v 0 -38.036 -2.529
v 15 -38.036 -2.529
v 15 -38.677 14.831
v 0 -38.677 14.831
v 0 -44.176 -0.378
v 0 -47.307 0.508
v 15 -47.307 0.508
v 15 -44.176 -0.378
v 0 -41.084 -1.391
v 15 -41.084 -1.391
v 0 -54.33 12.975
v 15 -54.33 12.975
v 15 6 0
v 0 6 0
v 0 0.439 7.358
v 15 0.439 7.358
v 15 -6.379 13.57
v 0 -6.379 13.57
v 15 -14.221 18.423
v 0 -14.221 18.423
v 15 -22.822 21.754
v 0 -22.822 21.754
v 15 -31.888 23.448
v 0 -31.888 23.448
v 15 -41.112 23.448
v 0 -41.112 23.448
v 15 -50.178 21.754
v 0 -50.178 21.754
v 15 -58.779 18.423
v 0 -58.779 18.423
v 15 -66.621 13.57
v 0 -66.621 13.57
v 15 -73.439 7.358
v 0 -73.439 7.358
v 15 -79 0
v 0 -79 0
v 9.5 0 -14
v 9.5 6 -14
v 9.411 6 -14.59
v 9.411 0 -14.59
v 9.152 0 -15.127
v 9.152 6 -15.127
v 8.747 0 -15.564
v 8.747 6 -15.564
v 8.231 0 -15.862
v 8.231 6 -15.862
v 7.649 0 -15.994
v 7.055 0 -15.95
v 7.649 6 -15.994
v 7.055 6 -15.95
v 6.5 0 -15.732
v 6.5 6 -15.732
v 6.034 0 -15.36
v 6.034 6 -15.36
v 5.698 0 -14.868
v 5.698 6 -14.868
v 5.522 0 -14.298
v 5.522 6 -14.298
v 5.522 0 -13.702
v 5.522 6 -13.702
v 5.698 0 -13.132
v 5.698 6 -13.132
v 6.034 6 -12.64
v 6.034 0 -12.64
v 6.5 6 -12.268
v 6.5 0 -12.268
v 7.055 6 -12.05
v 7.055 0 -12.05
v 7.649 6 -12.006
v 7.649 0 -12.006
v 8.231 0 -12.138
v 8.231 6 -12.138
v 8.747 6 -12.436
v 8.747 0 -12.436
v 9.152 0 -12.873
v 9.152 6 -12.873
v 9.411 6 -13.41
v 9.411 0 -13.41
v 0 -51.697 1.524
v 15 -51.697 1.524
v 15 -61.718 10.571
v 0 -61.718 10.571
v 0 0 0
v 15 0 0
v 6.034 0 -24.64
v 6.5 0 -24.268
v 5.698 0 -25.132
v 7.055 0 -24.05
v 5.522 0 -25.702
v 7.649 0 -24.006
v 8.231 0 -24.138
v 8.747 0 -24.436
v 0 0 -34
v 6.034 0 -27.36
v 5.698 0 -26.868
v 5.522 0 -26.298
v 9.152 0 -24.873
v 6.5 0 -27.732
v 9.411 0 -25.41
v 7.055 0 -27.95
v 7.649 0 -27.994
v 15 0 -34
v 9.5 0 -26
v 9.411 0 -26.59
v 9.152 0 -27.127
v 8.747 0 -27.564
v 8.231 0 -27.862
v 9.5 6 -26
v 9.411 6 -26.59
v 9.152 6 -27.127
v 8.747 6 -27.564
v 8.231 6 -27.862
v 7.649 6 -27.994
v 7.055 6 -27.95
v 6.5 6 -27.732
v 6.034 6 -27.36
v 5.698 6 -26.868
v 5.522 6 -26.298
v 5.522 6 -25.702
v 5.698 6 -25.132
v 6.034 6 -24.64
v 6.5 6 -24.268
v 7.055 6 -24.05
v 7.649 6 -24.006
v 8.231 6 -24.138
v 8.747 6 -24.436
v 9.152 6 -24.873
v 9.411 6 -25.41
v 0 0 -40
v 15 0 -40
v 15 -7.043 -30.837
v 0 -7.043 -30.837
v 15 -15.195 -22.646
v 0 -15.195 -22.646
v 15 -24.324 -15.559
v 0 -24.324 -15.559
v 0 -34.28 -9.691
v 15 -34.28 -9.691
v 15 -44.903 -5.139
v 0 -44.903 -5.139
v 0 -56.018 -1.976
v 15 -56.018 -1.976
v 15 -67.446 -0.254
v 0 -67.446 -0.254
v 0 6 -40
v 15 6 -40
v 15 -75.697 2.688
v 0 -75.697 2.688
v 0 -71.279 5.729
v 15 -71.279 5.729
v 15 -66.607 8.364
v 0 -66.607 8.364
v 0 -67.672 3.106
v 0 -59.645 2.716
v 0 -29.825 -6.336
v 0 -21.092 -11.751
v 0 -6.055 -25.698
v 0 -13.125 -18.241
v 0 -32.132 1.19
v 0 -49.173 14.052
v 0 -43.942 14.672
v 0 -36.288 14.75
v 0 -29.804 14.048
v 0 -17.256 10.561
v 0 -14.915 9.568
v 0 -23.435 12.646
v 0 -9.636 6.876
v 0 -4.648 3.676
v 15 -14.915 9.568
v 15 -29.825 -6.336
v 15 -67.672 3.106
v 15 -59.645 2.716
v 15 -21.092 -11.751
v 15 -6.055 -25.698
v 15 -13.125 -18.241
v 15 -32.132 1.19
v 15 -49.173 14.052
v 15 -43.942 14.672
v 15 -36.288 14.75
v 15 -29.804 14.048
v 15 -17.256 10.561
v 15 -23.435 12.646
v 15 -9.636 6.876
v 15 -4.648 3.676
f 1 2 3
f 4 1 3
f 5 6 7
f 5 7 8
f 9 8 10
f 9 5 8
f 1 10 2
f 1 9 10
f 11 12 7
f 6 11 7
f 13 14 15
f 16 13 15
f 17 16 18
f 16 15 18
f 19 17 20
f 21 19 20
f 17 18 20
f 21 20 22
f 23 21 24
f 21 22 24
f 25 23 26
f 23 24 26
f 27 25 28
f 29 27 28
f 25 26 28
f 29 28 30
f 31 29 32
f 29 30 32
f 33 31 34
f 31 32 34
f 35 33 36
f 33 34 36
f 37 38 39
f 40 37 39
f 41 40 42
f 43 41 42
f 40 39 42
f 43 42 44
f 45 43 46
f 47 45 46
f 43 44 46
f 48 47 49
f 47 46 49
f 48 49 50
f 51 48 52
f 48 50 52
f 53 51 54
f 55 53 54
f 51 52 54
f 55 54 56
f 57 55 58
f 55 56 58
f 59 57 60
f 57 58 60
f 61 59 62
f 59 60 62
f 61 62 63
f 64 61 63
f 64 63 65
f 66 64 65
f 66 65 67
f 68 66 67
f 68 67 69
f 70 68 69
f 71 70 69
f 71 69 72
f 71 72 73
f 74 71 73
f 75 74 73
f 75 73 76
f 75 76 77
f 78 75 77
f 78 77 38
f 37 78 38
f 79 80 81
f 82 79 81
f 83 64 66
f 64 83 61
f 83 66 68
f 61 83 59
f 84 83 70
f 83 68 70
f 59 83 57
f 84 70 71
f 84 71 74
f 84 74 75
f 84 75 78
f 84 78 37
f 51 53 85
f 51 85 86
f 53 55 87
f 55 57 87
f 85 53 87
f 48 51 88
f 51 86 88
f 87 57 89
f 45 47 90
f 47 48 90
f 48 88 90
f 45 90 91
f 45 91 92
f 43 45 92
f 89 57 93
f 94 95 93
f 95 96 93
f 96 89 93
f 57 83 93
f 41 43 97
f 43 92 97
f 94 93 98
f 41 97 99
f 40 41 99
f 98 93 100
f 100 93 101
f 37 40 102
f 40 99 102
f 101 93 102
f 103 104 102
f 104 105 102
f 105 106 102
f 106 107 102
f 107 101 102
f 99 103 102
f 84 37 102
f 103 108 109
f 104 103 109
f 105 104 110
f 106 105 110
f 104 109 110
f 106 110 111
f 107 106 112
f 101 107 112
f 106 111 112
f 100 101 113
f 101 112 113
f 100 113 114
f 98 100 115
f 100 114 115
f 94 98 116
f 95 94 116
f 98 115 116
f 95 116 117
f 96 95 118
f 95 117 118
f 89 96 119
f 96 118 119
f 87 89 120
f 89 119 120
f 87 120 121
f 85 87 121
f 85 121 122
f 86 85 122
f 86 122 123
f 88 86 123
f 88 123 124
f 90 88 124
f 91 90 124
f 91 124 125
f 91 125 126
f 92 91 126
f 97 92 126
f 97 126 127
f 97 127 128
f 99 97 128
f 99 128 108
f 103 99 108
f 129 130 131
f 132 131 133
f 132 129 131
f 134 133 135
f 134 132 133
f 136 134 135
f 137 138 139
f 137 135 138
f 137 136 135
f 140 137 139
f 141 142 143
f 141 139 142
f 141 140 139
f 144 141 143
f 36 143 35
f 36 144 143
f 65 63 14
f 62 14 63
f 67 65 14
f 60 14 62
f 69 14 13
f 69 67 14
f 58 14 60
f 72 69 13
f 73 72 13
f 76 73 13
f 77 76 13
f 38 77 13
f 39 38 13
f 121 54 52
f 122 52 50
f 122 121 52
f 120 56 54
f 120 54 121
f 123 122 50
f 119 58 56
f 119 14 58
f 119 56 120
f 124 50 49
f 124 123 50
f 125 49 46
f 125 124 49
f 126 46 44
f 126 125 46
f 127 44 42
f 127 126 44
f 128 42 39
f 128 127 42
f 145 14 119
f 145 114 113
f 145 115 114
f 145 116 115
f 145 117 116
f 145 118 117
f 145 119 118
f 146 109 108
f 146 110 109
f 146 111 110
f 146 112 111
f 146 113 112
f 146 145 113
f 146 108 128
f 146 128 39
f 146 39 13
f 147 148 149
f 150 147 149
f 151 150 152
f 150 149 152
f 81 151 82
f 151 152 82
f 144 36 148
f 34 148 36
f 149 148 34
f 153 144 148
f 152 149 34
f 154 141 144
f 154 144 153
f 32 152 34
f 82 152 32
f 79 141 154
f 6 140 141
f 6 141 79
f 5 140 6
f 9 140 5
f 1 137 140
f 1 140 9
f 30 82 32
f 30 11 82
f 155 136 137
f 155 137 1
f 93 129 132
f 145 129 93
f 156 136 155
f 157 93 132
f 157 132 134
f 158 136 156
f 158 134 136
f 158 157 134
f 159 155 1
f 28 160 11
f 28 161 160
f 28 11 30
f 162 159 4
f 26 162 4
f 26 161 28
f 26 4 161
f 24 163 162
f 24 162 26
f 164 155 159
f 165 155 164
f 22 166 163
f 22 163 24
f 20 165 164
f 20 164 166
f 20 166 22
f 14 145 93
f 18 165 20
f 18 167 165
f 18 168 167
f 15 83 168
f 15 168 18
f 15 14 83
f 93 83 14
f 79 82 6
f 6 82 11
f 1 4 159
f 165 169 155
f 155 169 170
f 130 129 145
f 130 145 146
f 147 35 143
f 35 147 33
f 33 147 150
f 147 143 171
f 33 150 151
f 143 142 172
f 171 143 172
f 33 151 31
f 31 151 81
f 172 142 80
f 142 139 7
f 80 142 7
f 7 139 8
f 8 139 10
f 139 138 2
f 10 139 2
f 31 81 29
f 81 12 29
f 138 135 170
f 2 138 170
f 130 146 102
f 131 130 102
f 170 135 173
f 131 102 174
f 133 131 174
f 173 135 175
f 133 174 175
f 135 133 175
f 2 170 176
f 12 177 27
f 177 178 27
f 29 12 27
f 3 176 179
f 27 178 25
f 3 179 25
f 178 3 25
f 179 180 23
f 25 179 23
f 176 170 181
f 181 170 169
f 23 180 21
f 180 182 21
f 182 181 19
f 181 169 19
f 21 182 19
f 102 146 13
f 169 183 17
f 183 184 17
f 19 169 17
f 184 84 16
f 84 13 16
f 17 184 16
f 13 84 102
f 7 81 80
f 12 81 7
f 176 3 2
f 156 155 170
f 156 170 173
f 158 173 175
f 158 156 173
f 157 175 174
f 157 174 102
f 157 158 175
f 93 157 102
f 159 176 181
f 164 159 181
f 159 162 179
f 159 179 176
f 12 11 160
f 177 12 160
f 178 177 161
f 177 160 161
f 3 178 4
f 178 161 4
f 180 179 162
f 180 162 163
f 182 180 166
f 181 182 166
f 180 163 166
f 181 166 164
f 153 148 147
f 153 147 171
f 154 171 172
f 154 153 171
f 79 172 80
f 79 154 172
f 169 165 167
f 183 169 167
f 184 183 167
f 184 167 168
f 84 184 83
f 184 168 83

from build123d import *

# Parameters (mm, degrees)
SKETCH1_W            = 15
SKETCH1_H            = 40
BOSS_EXTRUDE1_DEPTH  = 6
BOSS_EXTRUDE3_DEPTH  = 15
BOSS_EXTRUDE7_DEPTH  = 15
BOSS_EXTRUDE9_DEPTH  = 15
BOSS_EXTRUDE10_DEPTH = 15
BOSS_EXTRUDE11_DEPTH = 15
CUT_EXTRUDE2_REACH   = 87
SKETCH11_R           = 2


with BuildPart() as part:
    # Sketch1 → Boss-Extrude1 (new body)
    with BuildSketch(Plane(origin=(0, 0, 0), x_dir=(1, 0, 0), z_dir=(0, 1, 0))):
        with Locations((7.5, 20)):
            Rectangle(SKETCH1_W, SKETCH1_H)
    extrude(amount=BOSS_EXTRUDE1_DEPTH)

    # Sketch2 → Boss-Extrude3 (add)
    with BuildSketch(Plane.ZY):
        with BuildLine():
            Line((0, 0), (0, 6))
            ThreePointArc((0, 6), (23.660865618, -36.5), (0, -79))
            ThreePointArc((0, -79), (14.836408469, -39.5), (0, 0))
        make_face()
    extrude(amount=-BOSS_EXTRUDE3_DEPTH)

    # Sketch4 → Boss-Extrude7 (add)
    with BuildSketch(Plane.ZY):
        with BuildLine():
            ThreePointArc((2.687694394, -75.697436861), (-4.903747344, -32.637432794), (-34, 0))
            Line((-34, 0), (-40, 0))
            ThreePointArc((-40, 0), (-9.691402152, -34.280456786), (0, -79))
            ThreePointArc((0, -79), (1.37315296, -77.372568069), (2.687694394, -75.697436861))
        make_face()
    extrude(amount=-BOSS_EXTRUDE7_DEPTH)

    # Sketch6 → Boss-Extrude9 (add)
    with BuildSketch(Plane(origin=(15, 0, 0), x_dir=(0, 0, -1), z_dir=(1, 0, 0))):
        with BuildLine():
            Line((-23.598326506, -39), (6.336124845, -29.82478781))
            ThreePointArc((6.336124845, -29.82478781), (7.039786657, -35.139310612), (2.528857435, -38.036000122))
            Line((2.528857435, -38.036000122), (-23.598326506, -39))
        make_face()
    extrude(amount=-BOSS_EXTRUDE9_DEPTH)

    # Sketch7 → Boss-Extrude10 (add)
    with BuildSketch(Plane(origin=(15, 0, 0), x_dir=(0, 0, -1), z_dir=(1, 0, 0))):
        Polygon((-12.974883891, -54.329621557), (5.491788936, -43.926999792), (-14.212166694, -65.750503945), align=None)
    extrude(amount=-BOSS_EXTRUDE10_DEPTH)

    # Sketch8 → Boss-Extrude11 (add)
    with BuildSketch(Plane(origin=(15, 0, 0), x_dir=(0, 0, -1), z_dir=(1, 0, 0))):
        Polygon((-15.593532308, -9.266721382), (6.336124845, -29.82478781), (2.528857435, -38.036000122), align=None)
    extrude(amount=-BOSS_EXTRUDE11_DEPTH)

    # Sketch11 → Cut-Extrude2 (cut, up to next)
    with BuildSketch(Plane(origin=(0, 6, 0), x_dir=(1, 0, 0), z_dir=(0, 1, 0)), mode=Mode.PRIVATE) as cut_extrude2_sk1:
        with Locations((7.5, 26)):
            Circle(SKETCH11_R)
    cut_extrude2_tool1 = extrude(cut_extrude2_sk1.sketch, amount=-CUT_EXTRUDE2_REACH, mode=Mode.PRIVATE) & part.part
    add(cut_extrude2_tool1.solids().sort_by_distance((7.5, 6, -26))[0], mode=Mode.SUBTRACT)
    # Sketch11 → Cut-Extrude2 (cut, up to next)
    with BuildSketch(Plane(origin=(0, 6, 0), x_dir=(1, 0, 0), z_dir=(0, 1, 0)), mode=Mode.PRIVATE) as cut_extrude2_sk2:
        with Locations((7.5, 14)):
            Circle(SKETCH11_R)
    cut_extrude2_tool2 = extrude(cut_extrude2_sk2.sketch, amount=-CUT_EXTRUDE2_REACH, mode=Mode.PRIVATE) & part.part
    add(cut_extrude2_tool2.solids().sort_by_distance((7.5, 6, -14))[0], mode=Mode.SUBTRACT)


solid = part.part
